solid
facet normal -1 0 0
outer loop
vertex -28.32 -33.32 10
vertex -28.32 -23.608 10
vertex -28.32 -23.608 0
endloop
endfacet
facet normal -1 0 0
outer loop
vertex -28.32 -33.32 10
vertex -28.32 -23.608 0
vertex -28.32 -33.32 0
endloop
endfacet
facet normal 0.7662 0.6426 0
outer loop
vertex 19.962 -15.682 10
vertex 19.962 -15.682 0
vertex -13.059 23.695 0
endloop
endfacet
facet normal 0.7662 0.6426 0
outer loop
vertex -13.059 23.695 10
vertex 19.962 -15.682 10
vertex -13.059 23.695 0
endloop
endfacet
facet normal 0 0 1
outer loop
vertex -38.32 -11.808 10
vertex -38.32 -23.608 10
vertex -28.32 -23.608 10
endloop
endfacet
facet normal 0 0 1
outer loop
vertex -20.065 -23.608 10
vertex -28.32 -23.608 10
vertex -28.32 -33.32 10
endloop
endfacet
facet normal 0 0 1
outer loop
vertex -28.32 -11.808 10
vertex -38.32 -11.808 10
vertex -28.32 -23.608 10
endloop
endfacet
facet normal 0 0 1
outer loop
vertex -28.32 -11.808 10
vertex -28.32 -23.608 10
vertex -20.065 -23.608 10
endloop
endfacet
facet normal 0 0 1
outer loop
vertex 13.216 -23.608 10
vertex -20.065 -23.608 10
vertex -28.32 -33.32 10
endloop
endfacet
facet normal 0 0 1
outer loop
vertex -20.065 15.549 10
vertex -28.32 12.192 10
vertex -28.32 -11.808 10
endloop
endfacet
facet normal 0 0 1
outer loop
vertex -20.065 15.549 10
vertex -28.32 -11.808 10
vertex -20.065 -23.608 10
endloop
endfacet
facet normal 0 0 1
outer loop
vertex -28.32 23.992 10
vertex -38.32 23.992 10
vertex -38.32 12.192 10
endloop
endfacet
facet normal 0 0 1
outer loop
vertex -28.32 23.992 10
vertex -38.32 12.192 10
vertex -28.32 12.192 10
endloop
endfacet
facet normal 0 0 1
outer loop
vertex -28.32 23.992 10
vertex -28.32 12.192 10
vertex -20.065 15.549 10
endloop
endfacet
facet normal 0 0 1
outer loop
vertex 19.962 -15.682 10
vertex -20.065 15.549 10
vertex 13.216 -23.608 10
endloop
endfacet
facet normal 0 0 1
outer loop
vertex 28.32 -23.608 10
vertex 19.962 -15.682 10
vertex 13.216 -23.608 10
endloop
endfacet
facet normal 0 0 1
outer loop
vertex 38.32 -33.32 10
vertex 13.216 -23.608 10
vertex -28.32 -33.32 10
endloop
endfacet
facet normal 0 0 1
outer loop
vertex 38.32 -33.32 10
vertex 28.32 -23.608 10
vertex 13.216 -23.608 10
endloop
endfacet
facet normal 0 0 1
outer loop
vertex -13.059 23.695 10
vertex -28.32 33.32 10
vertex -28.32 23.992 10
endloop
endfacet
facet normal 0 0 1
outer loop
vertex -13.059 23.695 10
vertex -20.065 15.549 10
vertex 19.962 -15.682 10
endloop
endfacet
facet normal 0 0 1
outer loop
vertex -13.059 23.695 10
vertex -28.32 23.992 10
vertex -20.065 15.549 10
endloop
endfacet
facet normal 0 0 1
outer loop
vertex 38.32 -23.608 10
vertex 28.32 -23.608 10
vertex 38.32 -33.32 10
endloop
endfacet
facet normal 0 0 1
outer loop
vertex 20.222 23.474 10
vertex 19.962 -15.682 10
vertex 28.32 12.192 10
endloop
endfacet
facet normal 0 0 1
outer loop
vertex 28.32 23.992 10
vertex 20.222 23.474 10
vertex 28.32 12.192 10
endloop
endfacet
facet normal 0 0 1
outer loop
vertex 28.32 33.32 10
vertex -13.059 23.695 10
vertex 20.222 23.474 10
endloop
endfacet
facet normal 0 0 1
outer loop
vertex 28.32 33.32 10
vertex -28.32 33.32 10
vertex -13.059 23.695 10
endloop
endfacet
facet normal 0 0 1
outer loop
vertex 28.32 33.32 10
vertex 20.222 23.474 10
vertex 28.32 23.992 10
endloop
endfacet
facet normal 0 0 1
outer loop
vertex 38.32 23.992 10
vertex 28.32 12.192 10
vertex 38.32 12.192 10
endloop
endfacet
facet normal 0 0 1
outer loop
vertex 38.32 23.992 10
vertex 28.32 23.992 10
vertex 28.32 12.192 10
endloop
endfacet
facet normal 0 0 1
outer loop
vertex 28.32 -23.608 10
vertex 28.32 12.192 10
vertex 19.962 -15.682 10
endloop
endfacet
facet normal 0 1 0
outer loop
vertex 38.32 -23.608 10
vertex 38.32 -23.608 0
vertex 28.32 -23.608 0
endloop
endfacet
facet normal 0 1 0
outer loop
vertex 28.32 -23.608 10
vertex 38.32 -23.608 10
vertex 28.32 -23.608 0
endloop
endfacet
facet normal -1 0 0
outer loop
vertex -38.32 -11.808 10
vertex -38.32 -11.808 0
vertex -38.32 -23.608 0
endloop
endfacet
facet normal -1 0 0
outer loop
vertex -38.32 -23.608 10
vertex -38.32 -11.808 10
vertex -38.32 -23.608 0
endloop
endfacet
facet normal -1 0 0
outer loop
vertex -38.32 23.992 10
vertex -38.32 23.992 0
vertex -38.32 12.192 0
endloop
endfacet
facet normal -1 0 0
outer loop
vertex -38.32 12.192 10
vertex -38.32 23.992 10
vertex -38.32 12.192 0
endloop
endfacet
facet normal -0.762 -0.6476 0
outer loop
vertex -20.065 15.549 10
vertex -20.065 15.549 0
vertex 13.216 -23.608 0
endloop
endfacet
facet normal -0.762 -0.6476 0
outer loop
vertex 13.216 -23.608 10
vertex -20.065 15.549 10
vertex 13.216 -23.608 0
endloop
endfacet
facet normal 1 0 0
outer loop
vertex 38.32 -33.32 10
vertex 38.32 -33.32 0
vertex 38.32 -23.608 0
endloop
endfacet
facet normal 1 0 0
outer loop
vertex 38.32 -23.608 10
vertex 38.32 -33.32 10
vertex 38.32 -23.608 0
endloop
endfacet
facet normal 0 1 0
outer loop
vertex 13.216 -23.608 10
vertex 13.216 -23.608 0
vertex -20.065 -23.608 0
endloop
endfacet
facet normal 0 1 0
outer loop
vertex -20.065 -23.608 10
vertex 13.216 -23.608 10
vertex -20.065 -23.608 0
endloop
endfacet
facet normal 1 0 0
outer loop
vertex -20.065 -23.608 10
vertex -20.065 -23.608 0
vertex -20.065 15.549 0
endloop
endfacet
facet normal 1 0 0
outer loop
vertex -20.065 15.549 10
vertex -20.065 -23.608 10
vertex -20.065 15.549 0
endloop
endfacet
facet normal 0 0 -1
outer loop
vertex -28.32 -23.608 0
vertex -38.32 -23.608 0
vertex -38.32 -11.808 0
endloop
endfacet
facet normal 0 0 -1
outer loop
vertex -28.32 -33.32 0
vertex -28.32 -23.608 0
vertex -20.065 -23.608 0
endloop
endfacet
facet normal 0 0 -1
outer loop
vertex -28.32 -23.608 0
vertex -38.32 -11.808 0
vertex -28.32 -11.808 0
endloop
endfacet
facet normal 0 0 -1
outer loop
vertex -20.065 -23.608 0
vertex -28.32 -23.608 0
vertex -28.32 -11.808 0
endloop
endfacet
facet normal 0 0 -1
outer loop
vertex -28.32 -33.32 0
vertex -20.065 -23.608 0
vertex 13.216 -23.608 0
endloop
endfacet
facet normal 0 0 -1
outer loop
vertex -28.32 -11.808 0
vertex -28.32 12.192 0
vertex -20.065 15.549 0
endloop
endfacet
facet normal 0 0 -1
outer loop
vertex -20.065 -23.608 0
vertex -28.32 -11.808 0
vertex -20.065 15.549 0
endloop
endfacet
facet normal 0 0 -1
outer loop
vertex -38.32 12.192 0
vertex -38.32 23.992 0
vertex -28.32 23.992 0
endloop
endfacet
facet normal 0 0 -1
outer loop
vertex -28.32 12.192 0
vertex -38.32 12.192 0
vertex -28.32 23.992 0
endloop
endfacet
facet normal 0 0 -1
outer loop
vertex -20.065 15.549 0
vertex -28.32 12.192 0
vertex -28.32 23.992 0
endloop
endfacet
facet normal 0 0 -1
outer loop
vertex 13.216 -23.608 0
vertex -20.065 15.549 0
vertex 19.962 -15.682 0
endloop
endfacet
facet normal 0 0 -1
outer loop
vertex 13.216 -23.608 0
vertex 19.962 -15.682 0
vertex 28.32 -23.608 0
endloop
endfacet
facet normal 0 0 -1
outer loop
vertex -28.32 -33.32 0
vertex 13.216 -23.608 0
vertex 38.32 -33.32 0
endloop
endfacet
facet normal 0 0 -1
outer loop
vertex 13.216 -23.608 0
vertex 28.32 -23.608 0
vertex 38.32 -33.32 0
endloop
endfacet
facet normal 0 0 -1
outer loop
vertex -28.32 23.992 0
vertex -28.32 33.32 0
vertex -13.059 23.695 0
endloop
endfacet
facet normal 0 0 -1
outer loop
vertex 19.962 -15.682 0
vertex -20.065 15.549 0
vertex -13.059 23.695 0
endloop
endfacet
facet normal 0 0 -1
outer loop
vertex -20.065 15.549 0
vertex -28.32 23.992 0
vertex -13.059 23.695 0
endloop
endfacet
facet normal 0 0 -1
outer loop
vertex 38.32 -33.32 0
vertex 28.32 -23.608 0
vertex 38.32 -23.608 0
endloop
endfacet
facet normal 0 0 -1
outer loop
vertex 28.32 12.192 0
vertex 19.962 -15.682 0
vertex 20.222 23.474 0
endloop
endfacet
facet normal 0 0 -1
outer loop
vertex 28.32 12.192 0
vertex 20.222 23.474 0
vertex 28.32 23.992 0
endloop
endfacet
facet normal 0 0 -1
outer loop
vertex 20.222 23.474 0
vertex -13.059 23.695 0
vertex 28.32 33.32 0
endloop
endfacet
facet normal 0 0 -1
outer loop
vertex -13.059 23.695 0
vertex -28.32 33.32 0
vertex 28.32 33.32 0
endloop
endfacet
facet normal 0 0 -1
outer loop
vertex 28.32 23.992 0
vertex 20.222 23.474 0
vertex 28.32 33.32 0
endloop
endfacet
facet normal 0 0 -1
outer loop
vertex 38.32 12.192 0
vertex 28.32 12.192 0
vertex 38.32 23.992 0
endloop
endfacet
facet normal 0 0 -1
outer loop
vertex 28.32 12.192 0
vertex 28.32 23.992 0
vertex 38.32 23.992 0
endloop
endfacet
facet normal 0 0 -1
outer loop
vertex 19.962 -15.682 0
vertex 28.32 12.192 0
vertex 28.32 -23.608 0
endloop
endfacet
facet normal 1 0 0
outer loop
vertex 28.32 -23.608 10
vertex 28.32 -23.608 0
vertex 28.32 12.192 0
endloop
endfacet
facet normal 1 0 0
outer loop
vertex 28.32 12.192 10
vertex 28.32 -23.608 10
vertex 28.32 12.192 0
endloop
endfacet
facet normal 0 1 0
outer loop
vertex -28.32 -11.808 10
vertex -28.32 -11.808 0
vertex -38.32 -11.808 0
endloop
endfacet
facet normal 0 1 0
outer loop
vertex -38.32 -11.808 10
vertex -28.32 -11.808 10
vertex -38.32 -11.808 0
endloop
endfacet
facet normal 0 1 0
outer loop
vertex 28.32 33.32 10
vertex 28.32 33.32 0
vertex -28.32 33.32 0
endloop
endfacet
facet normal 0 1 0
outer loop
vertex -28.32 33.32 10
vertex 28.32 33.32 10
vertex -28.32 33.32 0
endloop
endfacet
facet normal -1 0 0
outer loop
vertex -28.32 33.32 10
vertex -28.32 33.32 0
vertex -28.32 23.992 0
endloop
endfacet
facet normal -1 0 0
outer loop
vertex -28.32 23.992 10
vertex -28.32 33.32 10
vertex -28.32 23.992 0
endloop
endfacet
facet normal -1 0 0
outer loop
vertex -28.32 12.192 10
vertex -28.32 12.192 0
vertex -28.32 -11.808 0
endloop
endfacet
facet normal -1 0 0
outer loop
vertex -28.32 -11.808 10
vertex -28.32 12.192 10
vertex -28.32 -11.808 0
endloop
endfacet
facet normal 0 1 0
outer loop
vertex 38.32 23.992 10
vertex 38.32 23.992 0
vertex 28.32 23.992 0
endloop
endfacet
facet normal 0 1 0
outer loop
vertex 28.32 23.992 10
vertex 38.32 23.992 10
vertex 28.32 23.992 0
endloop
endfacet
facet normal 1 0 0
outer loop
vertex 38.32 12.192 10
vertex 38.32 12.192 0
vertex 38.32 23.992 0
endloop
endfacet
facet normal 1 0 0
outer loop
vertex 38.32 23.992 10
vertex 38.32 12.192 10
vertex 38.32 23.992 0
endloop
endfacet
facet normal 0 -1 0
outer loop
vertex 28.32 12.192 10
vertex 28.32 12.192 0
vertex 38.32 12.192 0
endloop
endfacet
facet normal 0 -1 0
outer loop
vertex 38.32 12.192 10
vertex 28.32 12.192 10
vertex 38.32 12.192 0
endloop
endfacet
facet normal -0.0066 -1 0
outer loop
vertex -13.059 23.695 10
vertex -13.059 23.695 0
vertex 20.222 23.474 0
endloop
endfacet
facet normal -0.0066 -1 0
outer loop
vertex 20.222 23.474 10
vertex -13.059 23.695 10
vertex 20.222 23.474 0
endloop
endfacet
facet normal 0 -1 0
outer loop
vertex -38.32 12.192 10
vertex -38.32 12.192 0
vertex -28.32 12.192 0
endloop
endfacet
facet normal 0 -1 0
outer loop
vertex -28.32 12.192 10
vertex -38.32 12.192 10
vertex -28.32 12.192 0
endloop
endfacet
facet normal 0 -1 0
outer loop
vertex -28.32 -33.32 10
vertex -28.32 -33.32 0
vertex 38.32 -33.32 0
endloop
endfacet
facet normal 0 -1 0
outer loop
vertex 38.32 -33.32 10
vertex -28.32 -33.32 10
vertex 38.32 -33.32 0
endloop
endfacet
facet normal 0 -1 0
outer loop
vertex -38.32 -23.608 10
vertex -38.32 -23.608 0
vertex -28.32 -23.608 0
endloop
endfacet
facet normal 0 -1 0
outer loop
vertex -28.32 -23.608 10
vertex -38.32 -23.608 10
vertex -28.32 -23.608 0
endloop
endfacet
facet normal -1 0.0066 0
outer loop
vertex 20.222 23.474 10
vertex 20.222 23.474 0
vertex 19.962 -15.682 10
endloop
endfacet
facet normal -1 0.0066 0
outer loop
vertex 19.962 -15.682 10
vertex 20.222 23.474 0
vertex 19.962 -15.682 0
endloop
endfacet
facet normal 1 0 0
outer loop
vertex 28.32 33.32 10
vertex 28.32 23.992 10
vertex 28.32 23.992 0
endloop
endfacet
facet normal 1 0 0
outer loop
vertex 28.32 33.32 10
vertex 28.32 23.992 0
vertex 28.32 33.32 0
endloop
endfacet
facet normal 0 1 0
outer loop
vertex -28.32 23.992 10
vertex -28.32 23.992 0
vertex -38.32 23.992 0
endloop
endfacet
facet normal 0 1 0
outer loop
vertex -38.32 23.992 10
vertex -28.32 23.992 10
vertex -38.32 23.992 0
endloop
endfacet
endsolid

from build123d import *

# Parameters (mm, degrees)
EXTRUDE_1_DEPTH = 10


with BuildPart() as part:
    # 草图1 → 凸台-拉伸1 (new body)
    with BuildSketch(Plane.XY):
        Polygon((-28.32, 23.992), (-38.32, 23.992), (-38.32, 12.192), (-28.32, 12.192), (-28.32, -11.808), (-38.32, -11.808), (-38.32, -23.608), (-28.32, -23.608), (-28.32, -33.32), (28.32, -33.32), (38.32, -33.32), (38.32, -23.608), (28.32, -23.608), (28.32, 12.192), (38.32, 12.192), (38.32, 23.992), (28.32, 23.992), (28.32, 33.32), (-28.32, 33.32), align=None)
        Polygon((-20.065382953, 15.549088882), (13.215792231, -23.608), (-20.065382953, -23.608), align=None, mode=Mode.SUBTRACT)
        Polygon((19.961624404, -15.682069675), (-13.058637611, 23.695290925), (20.221802898, 23.474154822), align=None, mode=Mode.SUBTRACT)
    extrude(amount=EXTRUDE_1_DEPTH)


solid = part.part
